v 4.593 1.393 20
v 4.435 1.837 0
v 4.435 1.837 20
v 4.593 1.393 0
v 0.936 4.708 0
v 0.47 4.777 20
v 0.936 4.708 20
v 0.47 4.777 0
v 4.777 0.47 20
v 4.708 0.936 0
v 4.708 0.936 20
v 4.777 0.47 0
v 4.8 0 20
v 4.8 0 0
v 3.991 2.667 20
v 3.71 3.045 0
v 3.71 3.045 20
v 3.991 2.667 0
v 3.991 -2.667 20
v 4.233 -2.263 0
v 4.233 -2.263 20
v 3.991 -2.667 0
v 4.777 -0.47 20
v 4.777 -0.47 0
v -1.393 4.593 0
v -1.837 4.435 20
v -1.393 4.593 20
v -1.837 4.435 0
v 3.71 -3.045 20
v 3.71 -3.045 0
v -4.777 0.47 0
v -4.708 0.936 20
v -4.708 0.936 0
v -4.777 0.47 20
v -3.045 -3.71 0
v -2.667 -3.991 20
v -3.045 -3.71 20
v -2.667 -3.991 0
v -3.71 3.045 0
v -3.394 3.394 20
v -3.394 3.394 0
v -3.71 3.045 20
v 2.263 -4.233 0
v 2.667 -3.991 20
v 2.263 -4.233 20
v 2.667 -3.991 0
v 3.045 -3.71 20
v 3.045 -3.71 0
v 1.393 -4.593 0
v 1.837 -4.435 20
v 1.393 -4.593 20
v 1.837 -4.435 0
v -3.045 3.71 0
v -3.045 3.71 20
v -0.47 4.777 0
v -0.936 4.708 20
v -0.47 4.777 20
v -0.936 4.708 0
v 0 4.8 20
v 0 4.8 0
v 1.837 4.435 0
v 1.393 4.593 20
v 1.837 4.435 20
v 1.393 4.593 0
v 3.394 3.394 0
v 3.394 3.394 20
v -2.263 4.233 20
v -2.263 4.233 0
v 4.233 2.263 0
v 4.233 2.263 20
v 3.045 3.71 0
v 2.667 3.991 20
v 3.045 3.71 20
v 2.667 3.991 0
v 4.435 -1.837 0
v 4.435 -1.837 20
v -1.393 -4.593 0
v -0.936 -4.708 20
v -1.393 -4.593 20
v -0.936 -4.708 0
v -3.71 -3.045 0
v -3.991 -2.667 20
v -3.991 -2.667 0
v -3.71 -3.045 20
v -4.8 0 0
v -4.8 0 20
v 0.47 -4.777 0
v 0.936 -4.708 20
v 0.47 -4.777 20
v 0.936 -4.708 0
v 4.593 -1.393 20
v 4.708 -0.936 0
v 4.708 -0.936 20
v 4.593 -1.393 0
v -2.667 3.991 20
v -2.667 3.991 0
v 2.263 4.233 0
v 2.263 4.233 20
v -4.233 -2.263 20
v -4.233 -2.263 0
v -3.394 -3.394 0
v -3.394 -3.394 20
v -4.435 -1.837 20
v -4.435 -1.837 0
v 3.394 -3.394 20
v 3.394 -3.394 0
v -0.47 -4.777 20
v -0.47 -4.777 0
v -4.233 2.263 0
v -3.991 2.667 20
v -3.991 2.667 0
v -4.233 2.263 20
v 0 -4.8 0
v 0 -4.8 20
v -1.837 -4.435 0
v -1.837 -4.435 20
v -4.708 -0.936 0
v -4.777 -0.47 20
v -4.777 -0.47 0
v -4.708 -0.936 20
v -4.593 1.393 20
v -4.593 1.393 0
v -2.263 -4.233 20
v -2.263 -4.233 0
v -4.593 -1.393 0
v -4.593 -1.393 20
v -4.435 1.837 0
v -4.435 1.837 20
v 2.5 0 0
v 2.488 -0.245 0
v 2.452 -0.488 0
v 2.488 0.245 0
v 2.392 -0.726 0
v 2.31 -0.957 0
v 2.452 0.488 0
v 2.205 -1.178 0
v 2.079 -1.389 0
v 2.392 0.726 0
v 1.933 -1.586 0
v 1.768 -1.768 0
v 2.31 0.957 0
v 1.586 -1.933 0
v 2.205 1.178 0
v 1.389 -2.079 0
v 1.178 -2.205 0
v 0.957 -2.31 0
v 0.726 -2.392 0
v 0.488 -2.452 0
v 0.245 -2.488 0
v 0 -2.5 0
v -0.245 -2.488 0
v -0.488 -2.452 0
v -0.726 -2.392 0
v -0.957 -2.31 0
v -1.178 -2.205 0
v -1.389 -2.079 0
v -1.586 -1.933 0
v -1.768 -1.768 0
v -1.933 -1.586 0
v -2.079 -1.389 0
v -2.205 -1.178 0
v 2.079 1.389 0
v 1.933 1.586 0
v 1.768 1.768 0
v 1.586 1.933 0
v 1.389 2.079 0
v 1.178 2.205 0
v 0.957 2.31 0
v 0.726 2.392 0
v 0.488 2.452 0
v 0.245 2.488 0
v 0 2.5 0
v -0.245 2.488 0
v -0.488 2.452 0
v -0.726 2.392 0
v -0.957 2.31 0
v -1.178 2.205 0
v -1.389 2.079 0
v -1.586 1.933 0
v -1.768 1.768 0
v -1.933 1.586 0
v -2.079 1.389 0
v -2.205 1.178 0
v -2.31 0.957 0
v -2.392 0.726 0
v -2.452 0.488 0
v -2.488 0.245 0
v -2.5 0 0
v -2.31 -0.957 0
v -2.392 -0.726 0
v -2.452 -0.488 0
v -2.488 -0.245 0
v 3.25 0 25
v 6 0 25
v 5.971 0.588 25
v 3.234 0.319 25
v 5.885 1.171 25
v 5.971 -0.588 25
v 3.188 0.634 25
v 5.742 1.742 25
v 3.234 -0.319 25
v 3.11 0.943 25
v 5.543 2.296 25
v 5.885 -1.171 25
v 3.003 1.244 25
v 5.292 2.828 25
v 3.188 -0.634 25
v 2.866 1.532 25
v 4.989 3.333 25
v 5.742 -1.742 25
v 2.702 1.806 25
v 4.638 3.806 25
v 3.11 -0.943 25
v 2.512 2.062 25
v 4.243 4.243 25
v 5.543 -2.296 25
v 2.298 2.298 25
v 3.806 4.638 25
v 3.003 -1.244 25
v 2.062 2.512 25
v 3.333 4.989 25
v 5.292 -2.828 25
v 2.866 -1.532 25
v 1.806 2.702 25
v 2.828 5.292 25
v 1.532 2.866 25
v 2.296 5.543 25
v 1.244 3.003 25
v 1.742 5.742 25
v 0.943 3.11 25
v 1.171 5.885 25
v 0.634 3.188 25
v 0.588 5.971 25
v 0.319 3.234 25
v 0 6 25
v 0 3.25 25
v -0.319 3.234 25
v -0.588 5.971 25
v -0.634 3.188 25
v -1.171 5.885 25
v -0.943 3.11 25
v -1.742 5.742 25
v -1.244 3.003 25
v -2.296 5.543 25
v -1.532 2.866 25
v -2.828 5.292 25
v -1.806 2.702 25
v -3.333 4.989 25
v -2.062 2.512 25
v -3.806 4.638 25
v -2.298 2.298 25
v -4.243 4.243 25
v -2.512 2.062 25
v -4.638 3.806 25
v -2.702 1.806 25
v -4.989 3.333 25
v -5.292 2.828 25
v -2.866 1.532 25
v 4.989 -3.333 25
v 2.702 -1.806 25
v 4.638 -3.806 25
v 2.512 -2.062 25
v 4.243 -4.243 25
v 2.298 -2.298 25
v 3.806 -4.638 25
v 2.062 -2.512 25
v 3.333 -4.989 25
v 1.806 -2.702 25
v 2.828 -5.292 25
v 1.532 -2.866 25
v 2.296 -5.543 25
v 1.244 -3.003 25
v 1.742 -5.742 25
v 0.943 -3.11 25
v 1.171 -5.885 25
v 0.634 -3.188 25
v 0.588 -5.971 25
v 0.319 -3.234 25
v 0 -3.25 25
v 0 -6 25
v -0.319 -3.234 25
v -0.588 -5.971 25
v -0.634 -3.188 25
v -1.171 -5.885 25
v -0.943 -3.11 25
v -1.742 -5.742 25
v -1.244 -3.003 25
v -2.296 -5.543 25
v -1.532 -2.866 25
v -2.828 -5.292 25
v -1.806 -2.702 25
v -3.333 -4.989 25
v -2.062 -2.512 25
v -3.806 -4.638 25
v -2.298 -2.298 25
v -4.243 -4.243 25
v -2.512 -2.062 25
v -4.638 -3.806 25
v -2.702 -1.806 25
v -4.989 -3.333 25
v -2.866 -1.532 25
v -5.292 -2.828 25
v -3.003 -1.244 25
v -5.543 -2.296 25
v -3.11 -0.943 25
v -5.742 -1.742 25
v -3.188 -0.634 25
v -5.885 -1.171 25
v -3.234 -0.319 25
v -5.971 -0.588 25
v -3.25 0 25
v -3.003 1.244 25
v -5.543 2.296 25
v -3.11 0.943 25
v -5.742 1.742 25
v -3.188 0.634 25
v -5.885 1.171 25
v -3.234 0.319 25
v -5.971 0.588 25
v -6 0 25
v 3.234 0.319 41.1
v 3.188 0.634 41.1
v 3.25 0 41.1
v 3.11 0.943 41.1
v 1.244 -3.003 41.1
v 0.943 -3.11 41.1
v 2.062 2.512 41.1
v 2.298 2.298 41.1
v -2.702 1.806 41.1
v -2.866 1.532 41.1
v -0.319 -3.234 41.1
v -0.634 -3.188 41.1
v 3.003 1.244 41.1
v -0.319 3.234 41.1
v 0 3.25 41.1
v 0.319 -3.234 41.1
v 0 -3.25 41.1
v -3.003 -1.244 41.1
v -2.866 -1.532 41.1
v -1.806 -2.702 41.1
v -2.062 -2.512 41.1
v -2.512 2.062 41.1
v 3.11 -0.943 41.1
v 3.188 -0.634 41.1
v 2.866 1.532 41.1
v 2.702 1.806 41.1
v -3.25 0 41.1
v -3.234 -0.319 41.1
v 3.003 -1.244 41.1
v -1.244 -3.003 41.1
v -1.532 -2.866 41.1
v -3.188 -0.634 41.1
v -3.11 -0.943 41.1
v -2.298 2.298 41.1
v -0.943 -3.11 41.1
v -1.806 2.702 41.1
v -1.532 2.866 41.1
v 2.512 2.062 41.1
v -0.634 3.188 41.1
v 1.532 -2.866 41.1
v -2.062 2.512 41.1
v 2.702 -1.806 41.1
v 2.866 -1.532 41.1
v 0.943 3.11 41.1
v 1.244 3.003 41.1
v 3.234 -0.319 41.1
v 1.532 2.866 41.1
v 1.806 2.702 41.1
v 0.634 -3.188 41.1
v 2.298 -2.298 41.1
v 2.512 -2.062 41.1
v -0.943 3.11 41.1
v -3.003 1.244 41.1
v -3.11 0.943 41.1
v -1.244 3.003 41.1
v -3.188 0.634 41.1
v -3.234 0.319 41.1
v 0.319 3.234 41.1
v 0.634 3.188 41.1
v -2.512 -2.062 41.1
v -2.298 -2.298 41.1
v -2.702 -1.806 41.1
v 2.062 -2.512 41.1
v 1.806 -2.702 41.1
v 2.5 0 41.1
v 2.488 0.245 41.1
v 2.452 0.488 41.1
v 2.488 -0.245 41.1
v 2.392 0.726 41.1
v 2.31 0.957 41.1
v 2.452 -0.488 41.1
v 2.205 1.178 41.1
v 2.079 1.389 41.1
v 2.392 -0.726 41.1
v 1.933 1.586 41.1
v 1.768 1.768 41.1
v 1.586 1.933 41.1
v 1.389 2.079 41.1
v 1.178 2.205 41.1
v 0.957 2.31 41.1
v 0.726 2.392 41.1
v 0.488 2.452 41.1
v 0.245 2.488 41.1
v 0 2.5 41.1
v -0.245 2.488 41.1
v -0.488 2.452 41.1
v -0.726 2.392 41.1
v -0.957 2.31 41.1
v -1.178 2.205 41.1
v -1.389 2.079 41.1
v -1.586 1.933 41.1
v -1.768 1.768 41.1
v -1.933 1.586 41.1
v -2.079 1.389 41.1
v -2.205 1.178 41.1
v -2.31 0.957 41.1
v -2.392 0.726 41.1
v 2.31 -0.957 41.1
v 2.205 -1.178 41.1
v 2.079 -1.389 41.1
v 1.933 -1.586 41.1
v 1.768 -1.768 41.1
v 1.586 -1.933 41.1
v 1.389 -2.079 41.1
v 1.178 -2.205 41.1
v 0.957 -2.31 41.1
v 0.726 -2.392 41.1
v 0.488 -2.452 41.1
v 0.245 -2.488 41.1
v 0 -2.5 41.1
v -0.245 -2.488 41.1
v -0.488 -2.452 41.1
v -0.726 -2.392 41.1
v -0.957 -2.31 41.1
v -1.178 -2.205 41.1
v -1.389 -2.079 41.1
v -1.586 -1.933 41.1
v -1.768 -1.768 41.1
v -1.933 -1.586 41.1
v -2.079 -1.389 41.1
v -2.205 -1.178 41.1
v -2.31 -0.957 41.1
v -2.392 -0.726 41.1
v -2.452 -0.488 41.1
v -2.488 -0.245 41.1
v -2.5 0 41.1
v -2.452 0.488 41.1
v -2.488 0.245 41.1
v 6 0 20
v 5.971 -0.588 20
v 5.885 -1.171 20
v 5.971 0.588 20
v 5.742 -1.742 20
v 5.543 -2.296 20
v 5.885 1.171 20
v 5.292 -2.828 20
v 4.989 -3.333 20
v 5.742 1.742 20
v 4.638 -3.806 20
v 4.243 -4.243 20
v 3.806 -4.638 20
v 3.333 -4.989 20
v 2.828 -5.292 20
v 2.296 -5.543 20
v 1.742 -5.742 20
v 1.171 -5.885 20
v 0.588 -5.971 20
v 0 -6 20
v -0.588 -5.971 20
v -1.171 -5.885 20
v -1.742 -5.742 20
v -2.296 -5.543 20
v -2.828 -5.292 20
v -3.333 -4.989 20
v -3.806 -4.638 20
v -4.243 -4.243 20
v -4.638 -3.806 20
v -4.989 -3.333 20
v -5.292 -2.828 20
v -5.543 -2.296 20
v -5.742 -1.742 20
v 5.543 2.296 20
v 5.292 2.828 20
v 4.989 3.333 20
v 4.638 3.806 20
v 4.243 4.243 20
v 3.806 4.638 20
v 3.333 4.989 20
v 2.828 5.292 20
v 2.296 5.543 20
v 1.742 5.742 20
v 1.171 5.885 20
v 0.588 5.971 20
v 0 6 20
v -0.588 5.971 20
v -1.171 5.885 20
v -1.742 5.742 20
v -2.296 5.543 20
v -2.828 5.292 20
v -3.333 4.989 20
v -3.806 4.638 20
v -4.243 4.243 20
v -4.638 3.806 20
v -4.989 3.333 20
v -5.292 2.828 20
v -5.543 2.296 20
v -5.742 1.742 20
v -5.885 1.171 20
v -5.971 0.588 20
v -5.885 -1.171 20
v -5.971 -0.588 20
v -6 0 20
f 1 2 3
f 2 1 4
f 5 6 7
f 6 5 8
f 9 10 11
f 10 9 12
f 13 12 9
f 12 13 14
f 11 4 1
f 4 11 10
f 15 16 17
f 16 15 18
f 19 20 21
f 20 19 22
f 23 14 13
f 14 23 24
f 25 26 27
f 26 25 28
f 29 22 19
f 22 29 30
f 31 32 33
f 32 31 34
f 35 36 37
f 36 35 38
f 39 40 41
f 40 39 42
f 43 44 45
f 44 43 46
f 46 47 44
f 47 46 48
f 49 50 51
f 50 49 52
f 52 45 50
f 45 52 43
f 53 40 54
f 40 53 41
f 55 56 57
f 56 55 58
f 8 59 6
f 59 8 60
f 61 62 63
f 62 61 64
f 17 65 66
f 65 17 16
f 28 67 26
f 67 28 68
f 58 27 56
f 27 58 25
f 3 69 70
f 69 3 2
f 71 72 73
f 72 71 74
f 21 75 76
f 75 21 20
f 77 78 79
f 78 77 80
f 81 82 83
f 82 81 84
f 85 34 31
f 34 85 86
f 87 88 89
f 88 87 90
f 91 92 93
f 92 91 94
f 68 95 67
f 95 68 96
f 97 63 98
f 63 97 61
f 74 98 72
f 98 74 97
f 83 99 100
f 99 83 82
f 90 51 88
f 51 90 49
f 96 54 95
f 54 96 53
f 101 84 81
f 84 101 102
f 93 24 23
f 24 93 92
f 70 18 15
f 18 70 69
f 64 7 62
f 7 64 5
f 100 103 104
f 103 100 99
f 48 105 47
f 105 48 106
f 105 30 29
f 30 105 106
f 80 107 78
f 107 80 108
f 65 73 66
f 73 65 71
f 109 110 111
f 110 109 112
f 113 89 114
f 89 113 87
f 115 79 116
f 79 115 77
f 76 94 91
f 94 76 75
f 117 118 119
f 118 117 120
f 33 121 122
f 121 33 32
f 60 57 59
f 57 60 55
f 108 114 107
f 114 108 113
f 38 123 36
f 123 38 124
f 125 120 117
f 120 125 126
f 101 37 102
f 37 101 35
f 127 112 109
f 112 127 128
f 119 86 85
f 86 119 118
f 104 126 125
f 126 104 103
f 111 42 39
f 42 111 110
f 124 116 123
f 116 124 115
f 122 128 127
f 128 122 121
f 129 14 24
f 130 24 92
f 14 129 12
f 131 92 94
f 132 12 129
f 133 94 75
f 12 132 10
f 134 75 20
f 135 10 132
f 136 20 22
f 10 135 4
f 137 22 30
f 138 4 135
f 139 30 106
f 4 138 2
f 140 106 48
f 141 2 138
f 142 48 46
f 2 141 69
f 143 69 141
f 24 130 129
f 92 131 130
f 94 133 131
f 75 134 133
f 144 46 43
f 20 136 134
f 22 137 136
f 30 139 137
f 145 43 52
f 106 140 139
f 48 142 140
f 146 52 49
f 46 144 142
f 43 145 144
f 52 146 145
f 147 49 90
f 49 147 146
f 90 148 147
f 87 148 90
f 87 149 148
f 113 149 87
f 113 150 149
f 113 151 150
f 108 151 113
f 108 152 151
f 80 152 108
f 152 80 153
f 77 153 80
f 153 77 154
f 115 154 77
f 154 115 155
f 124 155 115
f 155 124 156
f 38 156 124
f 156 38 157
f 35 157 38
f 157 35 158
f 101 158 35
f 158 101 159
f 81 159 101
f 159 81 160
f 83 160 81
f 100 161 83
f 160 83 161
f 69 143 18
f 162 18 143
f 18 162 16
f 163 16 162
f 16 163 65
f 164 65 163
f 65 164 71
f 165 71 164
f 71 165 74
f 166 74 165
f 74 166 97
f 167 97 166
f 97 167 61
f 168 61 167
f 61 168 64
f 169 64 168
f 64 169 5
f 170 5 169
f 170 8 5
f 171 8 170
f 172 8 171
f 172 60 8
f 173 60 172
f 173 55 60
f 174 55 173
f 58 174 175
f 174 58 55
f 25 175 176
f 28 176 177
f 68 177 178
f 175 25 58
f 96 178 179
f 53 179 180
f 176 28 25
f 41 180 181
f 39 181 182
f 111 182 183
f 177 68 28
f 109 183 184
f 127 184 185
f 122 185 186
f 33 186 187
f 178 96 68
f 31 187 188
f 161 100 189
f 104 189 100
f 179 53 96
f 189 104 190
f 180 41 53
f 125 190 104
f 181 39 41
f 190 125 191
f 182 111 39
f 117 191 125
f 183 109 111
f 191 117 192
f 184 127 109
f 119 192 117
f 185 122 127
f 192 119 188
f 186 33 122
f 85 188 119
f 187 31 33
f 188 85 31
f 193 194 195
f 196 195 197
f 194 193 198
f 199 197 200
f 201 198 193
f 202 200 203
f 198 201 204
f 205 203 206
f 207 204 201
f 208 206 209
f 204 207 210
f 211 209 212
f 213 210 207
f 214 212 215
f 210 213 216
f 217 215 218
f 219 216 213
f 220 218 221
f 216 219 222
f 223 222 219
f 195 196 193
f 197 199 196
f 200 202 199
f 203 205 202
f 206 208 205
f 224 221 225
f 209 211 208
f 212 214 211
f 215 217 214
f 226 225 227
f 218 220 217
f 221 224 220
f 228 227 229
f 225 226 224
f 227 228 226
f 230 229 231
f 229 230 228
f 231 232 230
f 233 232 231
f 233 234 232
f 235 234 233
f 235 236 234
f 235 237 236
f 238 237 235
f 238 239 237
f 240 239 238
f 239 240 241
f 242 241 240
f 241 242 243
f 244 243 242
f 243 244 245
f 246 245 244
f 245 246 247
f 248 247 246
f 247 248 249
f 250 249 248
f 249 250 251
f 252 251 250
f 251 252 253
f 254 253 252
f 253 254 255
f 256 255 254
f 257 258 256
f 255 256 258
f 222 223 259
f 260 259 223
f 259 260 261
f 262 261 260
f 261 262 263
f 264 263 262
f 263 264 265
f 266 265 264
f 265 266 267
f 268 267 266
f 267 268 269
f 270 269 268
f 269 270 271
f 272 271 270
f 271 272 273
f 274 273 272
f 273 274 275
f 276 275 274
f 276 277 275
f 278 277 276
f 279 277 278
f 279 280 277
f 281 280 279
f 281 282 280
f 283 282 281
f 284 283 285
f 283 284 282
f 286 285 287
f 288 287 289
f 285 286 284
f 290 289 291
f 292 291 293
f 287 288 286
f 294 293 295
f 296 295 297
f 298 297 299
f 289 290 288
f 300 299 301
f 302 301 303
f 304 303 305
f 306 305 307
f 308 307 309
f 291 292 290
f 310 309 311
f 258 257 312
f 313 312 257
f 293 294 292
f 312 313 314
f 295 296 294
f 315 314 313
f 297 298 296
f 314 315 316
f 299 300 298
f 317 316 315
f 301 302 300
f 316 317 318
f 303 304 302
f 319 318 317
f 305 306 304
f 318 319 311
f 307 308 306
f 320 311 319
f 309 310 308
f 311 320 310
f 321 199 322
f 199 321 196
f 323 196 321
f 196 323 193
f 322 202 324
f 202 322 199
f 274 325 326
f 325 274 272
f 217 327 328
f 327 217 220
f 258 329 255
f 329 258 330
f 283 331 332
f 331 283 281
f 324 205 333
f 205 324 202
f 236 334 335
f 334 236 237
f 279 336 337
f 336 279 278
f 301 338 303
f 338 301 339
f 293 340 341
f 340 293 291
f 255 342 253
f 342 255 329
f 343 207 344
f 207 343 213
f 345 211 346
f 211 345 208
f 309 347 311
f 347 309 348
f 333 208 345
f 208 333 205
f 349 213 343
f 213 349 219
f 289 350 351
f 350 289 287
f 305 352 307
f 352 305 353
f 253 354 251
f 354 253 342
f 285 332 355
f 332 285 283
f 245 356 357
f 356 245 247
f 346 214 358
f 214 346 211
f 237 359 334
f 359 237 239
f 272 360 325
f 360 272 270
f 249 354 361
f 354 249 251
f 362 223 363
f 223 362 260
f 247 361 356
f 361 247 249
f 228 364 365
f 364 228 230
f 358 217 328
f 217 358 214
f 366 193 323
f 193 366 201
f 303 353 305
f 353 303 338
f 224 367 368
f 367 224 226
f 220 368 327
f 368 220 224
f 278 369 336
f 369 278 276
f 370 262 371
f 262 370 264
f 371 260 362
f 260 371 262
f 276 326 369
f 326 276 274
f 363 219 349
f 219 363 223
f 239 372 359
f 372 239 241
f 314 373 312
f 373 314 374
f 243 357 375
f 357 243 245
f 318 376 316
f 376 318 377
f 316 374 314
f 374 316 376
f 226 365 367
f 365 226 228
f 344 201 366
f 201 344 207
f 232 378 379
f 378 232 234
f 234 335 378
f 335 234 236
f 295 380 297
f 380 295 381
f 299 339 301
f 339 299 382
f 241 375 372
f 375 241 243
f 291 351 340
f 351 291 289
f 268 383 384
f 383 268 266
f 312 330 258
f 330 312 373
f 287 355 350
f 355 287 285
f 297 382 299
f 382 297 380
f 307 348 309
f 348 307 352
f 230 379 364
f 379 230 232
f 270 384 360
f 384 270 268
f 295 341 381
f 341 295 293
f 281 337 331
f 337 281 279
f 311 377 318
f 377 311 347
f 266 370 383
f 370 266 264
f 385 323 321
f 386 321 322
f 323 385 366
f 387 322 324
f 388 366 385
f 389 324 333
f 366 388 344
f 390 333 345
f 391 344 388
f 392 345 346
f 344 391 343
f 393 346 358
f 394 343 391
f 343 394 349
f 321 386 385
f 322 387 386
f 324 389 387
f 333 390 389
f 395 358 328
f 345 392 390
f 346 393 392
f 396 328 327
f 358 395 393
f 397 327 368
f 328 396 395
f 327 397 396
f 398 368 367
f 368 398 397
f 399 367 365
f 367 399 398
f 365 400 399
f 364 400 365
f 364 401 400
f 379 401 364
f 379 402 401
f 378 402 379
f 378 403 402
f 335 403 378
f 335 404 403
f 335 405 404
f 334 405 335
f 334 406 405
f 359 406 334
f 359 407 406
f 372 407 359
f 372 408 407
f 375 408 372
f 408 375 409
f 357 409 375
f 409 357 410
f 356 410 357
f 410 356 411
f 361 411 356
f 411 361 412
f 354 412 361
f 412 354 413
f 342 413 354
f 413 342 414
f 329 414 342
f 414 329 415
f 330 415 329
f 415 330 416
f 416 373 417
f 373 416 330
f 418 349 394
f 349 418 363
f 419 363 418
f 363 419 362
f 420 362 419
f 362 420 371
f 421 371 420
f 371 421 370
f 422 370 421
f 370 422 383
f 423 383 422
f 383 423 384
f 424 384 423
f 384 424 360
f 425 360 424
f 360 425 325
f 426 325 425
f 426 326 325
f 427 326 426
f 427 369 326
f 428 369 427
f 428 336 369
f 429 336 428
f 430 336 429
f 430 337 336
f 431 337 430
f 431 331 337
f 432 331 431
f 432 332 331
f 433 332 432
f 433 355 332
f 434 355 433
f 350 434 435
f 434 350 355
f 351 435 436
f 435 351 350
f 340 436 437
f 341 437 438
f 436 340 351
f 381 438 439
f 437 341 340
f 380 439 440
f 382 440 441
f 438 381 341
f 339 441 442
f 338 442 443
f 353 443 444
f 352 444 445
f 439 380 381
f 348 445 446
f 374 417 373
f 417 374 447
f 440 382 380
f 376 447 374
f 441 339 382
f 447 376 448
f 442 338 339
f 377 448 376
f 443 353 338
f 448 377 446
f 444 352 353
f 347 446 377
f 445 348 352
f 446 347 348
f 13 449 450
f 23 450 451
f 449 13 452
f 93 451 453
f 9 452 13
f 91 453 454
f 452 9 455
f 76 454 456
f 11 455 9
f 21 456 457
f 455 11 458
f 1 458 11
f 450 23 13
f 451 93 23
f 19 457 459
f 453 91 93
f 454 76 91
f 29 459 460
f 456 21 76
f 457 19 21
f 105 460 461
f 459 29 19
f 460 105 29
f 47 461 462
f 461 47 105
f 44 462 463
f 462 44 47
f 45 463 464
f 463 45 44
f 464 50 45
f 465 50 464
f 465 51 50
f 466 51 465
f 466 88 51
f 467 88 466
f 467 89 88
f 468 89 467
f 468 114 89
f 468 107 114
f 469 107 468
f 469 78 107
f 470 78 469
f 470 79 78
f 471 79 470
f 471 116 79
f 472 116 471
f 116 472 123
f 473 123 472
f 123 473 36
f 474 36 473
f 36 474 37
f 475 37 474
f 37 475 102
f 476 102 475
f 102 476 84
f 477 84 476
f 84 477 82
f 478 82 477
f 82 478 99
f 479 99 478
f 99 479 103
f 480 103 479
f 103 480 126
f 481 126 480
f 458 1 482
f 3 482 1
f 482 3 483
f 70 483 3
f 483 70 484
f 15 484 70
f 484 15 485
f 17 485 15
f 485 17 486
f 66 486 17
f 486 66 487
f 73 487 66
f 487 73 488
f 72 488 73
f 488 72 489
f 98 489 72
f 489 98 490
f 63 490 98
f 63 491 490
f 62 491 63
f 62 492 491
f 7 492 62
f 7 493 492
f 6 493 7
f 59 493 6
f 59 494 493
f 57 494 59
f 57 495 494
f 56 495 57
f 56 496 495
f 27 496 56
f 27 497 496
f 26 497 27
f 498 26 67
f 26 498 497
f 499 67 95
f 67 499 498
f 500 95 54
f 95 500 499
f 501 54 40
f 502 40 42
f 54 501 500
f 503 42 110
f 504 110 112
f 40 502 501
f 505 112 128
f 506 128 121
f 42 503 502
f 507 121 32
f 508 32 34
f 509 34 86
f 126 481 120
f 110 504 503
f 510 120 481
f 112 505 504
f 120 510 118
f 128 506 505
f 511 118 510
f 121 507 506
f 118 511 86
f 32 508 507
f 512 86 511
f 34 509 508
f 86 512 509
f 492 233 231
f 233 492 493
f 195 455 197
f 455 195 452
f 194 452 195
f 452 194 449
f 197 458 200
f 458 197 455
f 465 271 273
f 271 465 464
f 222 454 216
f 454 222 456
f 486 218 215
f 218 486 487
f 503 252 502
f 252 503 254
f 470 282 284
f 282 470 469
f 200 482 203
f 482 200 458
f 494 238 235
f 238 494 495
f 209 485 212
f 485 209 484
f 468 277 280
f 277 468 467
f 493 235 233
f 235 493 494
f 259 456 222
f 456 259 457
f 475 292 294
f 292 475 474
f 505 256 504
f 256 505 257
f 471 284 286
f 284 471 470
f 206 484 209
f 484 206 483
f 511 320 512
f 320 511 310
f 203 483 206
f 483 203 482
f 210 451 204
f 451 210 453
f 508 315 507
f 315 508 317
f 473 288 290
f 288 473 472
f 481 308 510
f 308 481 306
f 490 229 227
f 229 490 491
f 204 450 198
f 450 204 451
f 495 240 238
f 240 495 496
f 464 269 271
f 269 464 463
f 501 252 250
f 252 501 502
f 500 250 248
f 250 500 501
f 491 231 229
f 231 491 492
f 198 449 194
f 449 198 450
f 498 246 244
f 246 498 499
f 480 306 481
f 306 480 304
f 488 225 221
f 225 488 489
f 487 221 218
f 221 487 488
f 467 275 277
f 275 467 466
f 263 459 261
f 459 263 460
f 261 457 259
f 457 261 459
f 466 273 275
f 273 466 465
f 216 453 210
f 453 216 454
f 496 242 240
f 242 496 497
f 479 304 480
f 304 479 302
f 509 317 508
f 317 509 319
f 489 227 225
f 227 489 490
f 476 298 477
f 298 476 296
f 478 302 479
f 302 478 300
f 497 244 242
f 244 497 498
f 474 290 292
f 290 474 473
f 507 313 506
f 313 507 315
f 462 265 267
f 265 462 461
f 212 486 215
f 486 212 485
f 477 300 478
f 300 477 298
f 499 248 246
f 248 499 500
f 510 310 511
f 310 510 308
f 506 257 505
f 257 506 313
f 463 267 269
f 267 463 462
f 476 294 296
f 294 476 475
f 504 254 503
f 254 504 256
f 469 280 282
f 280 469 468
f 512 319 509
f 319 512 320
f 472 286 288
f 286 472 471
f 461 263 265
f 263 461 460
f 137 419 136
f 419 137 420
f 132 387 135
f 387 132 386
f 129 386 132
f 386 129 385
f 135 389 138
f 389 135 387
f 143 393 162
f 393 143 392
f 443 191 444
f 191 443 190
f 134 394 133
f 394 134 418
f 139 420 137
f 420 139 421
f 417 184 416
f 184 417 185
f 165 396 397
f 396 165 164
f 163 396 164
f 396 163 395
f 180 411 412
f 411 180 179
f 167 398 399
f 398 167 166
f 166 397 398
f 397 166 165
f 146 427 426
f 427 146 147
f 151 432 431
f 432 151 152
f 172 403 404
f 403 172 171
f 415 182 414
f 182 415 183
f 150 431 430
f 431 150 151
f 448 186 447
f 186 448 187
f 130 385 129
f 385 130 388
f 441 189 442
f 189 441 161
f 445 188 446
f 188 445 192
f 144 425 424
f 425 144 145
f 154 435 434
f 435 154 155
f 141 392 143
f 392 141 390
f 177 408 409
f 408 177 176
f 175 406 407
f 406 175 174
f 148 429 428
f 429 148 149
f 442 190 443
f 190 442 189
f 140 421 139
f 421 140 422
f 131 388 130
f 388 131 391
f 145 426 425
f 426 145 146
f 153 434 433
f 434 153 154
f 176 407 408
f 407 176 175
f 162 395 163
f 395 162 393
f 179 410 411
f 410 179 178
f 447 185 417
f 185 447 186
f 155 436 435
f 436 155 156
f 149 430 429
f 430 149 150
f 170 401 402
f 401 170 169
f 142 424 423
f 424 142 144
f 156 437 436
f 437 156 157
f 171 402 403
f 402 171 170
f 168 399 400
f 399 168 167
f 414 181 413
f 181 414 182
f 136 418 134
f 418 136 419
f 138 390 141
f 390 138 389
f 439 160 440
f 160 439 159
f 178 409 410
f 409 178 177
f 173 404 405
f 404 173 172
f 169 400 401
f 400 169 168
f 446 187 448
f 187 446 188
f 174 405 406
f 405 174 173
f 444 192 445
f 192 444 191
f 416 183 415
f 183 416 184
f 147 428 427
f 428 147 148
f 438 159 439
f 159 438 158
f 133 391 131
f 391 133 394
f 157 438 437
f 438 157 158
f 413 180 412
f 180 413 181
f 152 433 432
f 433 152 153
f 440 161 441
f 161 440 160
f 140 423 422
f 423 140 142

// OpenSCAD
$fn = 64;

// --- Dimensions (mm) ---
// Bore (inner diameter of tubing)
bore = 5.0; 

// 8mm Tubing Section
z_start_8mm = 0;
z_end_8mm = 20;
barb_h_8mm = 10;
barb_od_start_8mm = 7.5;
barb_od_end_8mm = 9.5;

// Transition Section
z_start_transition = 20;
z_end_transition = 25;
collar_diam = 12;

// 5mm Tubing Section
z_start_5mm = 25;
z_end_5mm = 41;
barb_h_5mm = 8;
barb_od_start_5mm = 6.5;
barb_od_end_5mm = 5.0;

// --- Geometry ---

// 1. Main Body (Cylinder with Barbs)
module main_body() {
    union() {
        // 8mm Section
        translate([0, 0, z_start_8mm])
        cylinder(h = z_end_8mm - z_start_8mm, d = barb_od_end_8mm, center = false);
        
        // Transition Section
        translate([0, 0, z_start_transition])
        cylinder(h = z_end_transition - z_start_transition, d = collar_diam, center = false);
        
        // 5mm Section
        translate([0, 0, z_start_5mm])
        cylinder(h = z_end_5mm - z_start_5mm, d = barb_od_end_5mm, center = false);
        
        // Barbs
        // 8mm Barbs (Stacked)
        for (i = [0, 1]) {
            translate([0, 0, z_start_8mm + (i * barb_h_8mm)])
            barb_shape(barb_h_8mm, barb_od_start_8mm, barb_od_end_8mm);
        }
        
        // 5mm Barbs (Stacked)
        for (i = [0, 1]) {
            translate([0, 0, z_start_5mm + (i * barb_h_5mm)])
            barb_shape(barb_h_5mm, barb_od_start_5mm, barb_od_end_5mm);
        }
    }
}

// Helper to create a single sawtooth barb
module barb_shape(height, od_start, od_end) {
    // The barb is a cylinder that is cut by a shape that is wider at the top
    // and narrower at the bottom.
    // We use a cylinder with a hole cut out by a shape that is wider at the top.
    
    // Outer shape (The "cutting" shape)
    // We extend it slightly past the faces to ensure clean cuts
    cut_height = height + 0.1;
    
    // The cutting shape is a cylinder with a "step" cut out.
    // It is wider at the top (od_end) and narrower at the bottom (od_start).
    // We model this as a cylinder with a hole.
    
    // Outer cylinder
    cylinder(h = cut_height, d = od_end + 0.1, center = false);
    
    // Inner cylinder (The hole)
    // The hole is wider at the top (bore + clearance) and narrower at the bottom (bore)
    // We model this as a cylinder with a "step" cut out.
    
    // Inner cylinder
    cylinder(h = cut_height, d = bore, center = false);
    
    // The "Step" cut (The part that makes it a sawtooth)
    // It is a cylinder that is wider at the bottom (od_start) and narrower at the top (bore)
    // This cylinder is subtracted from the inner cylinder.
    
    // Step cylinder
    cylinder(h = cut_height, d = od_start, center = false);
}

// 2. Bore (The hole)
module bore() {
    // The bore is a straight cylinder through the whole part
    // We extend it slightly past the top and bottom to ensure clean cuts
    total_length = z_end_5mm + 0.1;
    cylinder(h = total_length, d = bore, center = false);
}

// 3. Assembly
difference() {
    main_body();
    bore();
}
